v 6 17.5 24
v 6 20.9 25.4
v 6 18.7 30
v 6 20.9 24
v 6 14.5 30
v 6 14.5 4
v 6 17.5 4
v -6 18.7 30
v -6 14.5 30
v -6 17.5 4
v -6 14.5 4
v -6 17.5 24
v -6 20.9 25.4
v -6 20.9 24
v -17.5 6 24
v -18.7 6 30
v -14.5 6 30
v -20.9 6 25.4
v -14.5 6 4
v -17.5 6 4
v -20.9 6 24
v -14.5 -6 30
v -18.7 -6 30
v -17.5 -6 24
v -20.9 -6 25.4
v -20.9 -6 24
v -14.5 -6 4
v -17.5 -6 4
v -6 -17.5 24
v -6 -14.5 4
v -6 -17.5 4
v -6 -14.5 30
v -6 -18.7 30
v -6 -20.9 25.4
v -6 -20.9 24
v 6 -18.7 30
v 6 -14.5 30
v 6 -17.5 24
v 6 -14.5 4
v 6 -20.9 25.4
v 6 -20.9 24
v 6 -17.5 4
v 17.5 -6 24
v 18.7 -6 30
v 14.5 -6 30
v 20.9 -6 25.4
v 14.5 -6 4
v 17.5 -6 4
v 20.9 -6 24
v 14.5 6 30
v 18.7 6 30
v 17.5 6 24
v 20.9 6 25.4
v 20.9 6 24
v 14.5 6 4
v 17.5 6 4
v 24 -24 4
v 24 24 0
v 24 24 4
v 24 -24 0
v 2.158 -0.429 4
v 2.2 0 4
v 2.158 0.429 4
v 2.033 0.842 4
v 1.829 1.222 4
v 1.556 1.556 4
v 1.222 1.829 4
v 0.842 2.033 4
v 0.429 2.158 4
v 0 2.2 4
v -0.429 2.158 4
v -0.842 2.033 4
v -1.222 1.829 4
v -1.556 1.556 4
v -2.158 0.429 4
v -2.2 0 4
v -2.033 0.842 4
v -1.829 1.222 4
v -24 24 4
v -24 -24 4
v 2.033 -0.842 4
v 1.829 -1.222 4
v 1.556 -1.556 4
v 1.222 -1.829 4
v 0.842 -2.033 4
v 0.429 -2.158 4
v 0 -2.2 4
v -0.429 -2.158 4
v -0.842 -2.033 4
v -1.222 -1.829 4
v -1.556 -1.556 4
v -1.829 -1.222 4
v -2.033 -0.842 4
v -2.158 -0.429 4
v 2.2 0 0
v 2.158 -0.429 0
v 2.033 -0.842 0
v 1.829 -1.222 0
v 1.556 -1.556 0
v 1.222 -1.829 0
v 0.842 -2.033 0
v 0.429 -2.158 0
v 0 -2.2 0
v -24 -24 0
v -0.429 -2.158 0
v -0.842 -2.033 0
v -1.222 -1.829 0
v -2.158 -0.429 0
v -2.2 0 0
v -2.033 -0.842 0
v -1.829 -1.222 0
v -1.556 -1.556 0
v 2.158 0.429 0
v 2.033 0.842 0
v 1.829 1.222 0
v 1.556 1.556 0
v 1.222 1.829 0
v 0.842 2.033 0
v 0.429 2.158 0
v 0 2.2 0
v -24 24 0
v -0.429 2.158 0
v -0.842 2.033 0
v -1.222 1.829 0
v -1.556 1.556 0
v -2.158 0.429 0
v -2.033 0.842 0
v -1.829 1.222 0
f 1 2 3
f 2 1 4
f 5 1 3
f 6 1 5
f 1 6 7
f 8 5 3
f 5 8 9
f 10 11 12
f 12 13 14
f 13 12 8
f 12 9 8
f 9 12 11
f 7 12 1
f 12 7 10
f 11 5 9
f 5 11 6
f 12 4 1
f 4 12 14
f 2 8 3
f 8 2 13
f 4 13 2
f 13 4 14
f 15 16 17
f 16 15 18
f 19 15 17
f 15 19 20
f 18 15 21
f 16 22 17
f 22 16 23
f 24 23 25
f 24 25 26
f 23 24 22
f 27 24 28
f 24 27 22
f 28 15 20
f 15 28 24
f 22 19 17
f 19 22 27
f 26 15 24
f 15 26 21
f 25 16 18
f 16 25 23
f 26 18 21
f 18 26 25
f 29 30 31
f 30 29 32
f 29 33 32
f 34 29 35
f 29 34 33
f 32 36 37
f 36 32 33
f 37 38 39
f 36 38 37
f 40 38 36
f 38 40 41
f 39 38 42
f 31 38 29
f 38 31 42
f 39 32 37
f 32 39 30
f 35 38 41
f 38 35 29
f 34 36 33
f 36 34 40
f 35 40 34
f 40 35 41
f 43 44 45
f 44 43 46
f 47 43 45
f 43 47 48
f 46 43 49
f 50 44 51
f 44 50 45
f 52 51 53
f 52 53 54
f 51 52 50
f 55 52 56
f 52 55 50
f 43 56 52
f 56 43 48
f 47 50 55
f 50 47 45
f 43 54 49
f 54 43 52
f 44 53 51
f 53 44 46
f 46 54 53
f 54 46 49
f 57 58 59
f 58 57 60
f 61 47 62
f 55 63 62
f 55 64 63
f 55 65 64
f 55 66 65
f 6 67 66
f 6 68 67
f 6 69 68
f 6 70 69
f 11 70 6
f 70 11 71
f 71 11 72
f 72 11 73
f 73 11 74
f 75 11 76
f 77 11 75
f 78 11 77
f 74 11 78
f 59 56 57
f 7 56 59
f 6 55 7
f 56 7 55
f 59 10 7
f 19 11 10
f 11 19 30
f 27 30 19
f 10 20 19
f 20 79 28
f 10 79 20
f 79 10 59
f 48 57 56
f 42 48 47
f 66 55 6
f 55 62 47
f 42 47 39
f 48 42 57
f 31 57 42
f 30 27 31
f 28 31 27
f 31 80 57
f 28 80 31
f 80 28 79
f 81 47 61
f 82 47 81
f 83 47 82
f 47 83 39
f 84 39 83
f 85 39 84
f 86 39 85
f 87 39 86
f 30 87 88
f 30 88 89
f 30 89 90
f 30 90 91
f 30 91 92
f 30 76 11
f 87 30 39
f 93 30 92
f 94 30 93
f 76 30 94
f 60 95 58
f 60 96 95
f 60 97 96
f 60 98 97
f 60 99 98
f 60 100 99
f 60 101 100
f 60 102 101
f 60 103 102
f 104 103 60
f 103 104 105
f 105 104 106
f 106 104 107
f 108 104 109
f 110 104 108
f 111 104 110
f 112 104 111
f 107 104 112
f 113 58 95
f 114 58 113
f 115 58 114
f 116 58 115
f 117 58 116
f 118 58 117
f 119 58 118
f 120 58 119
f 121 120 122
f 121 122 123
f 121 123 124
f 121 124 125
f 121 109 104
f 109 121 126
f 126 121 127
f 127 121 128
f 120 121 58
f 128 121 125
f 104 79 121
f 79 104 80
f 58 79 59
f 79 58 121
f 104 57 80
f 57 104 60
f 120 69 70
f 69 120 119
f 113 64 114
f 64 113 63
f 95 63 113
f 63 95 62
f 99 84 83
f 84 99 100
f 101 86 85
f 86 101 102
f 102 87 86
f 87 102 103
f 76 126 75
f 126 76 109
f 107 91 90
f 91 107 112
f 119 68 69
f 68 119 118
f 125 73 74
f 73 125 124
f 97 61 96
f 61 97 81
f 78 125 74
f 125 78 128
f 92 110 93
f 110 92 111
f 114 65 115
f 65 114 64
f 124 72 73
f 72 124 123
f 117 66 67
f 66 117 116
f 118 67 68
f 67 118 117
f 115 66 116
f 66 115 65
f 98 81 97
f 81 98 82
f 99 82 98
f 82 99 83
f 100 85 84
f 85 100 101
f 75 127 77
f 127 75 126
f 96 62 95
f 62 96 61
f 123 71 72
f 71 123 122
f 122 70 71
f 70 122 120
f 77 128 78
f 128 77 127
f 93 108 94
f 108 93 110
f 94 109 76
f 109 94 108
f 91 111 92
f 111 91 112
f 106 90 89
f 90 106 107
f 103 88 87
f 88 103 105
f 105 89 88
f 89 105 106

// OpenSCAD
$fn = 32;

// ----------------------------------------------------------------------
// Snap-fit latch: 4 arms, 26 mm tall, 3.6 mm undercut hooks
// ----------------------------------------------------------------------

// --- parameters (mm) ---
base_d = 48;              // base plate depth
base_h = 4;               // base plate thickness
span = 32;                // distance between opposite arms
arm_t = 3;                // arm thickness
arm_d = 12;               // arm width
height = 26;              // free arm length
head_len = 3.6;           // hook reach
head_h = 6;               // hook height
lead = 1.4;               // lead-in ramp thickness
bore_d = 4.4;             // base fixing bore
top_z = 30;               // height of the arm tips above the base

arms = 4;

difference() {
  union() {
    /* base plate, centred on the arm ring */
    translate([-24, -24, 0]) cube([base_d, base_d, base_h]);
    for (a = [0 : 360 / arms : 359]) rotate([0, 0, a]) {
    /* arm, sunk 0.5 mm into the base */
    translate([-arm_d / 2, span / 2 - arm_t / 2, base_h - 0.5]) cube([arm_d, arm_t, height + 0.5]);
    /* hook: a convex hull of a tall inner block and a thin outer lip
       gives a flat undercut below and a lead-in ramp on top */
    hull() {
      translate([-arm_d / 2, span / 2 + arm_t / 2 - 0.6, top_z - head_h]) cube([arm_d, lead + 0.4, head_h]);
      translate([-arm_d / 2, span / 2 + arm_t / 2 - 0.2, top_z - head_h]) cube([arm_d, head_len, lead]);
    }
    }
  }
  translate([0, 0, -2.5]) cylinder(h = base_h + 5, d = bore_d);
}
